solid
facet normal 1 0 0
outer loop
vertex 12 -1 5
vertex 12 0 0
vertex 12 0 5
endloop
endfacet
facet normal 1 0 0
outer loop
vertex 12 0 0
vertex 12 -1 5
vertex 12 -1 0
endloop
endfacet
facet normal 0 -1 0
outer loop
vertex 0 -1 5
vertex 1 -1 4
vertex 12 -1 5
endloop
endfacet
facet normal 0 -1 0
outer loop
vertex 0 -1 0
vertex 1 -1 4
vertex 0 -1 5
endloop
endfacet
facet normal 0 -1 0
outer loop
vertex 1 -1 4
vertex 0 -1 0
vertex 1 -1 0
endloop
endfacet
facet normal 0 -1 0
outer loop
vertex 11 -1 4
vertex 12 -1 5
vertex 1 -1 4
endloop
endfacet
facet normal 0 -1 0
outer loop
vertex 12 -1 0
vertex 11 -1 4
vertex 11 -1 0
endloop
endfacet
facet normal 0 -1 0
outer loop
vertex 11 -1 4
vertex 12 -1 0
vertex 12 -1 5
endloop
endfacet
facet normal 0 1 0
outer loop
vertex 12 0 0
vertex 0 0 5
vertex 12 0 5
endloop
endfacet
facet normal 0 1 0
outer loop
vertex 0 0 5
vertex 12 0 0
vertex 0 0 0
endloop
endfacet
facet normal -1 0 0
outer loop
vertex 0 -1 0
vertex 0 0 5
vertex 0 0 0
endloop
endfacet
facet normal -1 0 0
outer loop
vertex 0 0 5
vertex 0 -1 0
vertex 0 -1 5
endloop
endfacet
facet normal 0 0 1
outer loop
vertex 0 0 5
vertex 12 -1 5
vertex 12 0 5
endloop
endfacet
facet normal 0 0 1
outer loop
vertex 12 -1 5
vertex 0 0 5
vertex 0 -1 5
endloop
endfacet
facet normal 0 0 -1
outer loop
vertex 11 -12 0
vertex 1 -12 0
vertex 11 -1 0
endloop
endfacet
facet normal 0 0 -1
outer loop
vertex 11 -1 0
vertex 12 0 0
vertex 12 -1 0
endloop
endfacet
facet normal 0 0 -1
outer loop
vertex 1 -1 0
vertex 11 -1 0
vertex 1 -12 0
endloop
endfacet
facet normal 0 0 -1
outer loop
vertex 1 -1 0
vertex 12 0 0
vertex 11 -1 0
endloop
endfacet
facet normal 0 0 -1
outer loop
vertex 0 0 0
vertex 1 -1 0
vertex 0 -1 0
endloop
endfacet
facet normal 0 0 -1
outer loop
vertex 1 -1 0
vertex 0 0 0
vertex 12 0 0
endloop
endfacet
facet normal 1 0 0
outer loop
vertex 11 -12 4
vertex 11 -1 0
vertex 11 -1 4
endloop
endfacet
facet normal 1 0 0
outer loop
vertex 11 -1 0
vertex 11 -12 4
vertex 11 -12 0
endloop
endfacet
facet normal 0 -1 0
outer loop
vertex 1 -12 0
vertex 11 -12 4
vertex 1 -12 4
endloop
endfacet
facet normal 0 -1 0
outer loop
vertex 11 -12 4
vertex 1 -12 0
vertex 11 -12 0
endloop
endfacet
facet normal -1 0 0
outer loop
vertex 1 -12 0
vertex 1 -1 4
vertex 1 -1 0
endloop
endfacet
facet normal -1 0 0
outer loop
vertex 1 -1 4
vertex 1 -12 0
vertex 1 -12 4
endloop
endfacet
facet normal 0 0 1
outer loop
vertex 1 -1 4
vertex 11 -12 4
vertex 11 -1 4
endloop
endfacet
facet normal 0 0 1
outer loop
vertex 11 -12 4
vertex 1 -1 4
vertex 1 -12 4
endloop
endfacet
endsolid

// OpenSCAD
// parameters
xwell = 10;
ywell = 3;
zwell = 8;

x_between_wells = 20;
xy_rim = 2;
z_rim = 1;
n_wells = 5;

module comb(xwell=10, 
				ywell=4, 
				zwell=11, 
				x_between_wells = 17, 
				xy_rim = 1, 
				n_wells=5){
	//rim
  rotate([90,0,0]){
	cube([xwell + (n_wells - 1) * x_between_wells + 2 * xy_rim, ywell + 1 * xy_rim, z_rim]);
	for (i = [1:n_wells]){
		echo (i);
//		x_pos = 1; // (i - 1) * x_between_wells + xy_rim;
		translate([(i - 1) * x_between_wells + xy_rim, 0, z_rim]){
			cube([xwell, ywell, zwell]);
		}
	}
  }
}

// seals
comb(n_wells=1);

// loading wells
//translate([0,30,0]) comb(xwell=7, zwell=6);
